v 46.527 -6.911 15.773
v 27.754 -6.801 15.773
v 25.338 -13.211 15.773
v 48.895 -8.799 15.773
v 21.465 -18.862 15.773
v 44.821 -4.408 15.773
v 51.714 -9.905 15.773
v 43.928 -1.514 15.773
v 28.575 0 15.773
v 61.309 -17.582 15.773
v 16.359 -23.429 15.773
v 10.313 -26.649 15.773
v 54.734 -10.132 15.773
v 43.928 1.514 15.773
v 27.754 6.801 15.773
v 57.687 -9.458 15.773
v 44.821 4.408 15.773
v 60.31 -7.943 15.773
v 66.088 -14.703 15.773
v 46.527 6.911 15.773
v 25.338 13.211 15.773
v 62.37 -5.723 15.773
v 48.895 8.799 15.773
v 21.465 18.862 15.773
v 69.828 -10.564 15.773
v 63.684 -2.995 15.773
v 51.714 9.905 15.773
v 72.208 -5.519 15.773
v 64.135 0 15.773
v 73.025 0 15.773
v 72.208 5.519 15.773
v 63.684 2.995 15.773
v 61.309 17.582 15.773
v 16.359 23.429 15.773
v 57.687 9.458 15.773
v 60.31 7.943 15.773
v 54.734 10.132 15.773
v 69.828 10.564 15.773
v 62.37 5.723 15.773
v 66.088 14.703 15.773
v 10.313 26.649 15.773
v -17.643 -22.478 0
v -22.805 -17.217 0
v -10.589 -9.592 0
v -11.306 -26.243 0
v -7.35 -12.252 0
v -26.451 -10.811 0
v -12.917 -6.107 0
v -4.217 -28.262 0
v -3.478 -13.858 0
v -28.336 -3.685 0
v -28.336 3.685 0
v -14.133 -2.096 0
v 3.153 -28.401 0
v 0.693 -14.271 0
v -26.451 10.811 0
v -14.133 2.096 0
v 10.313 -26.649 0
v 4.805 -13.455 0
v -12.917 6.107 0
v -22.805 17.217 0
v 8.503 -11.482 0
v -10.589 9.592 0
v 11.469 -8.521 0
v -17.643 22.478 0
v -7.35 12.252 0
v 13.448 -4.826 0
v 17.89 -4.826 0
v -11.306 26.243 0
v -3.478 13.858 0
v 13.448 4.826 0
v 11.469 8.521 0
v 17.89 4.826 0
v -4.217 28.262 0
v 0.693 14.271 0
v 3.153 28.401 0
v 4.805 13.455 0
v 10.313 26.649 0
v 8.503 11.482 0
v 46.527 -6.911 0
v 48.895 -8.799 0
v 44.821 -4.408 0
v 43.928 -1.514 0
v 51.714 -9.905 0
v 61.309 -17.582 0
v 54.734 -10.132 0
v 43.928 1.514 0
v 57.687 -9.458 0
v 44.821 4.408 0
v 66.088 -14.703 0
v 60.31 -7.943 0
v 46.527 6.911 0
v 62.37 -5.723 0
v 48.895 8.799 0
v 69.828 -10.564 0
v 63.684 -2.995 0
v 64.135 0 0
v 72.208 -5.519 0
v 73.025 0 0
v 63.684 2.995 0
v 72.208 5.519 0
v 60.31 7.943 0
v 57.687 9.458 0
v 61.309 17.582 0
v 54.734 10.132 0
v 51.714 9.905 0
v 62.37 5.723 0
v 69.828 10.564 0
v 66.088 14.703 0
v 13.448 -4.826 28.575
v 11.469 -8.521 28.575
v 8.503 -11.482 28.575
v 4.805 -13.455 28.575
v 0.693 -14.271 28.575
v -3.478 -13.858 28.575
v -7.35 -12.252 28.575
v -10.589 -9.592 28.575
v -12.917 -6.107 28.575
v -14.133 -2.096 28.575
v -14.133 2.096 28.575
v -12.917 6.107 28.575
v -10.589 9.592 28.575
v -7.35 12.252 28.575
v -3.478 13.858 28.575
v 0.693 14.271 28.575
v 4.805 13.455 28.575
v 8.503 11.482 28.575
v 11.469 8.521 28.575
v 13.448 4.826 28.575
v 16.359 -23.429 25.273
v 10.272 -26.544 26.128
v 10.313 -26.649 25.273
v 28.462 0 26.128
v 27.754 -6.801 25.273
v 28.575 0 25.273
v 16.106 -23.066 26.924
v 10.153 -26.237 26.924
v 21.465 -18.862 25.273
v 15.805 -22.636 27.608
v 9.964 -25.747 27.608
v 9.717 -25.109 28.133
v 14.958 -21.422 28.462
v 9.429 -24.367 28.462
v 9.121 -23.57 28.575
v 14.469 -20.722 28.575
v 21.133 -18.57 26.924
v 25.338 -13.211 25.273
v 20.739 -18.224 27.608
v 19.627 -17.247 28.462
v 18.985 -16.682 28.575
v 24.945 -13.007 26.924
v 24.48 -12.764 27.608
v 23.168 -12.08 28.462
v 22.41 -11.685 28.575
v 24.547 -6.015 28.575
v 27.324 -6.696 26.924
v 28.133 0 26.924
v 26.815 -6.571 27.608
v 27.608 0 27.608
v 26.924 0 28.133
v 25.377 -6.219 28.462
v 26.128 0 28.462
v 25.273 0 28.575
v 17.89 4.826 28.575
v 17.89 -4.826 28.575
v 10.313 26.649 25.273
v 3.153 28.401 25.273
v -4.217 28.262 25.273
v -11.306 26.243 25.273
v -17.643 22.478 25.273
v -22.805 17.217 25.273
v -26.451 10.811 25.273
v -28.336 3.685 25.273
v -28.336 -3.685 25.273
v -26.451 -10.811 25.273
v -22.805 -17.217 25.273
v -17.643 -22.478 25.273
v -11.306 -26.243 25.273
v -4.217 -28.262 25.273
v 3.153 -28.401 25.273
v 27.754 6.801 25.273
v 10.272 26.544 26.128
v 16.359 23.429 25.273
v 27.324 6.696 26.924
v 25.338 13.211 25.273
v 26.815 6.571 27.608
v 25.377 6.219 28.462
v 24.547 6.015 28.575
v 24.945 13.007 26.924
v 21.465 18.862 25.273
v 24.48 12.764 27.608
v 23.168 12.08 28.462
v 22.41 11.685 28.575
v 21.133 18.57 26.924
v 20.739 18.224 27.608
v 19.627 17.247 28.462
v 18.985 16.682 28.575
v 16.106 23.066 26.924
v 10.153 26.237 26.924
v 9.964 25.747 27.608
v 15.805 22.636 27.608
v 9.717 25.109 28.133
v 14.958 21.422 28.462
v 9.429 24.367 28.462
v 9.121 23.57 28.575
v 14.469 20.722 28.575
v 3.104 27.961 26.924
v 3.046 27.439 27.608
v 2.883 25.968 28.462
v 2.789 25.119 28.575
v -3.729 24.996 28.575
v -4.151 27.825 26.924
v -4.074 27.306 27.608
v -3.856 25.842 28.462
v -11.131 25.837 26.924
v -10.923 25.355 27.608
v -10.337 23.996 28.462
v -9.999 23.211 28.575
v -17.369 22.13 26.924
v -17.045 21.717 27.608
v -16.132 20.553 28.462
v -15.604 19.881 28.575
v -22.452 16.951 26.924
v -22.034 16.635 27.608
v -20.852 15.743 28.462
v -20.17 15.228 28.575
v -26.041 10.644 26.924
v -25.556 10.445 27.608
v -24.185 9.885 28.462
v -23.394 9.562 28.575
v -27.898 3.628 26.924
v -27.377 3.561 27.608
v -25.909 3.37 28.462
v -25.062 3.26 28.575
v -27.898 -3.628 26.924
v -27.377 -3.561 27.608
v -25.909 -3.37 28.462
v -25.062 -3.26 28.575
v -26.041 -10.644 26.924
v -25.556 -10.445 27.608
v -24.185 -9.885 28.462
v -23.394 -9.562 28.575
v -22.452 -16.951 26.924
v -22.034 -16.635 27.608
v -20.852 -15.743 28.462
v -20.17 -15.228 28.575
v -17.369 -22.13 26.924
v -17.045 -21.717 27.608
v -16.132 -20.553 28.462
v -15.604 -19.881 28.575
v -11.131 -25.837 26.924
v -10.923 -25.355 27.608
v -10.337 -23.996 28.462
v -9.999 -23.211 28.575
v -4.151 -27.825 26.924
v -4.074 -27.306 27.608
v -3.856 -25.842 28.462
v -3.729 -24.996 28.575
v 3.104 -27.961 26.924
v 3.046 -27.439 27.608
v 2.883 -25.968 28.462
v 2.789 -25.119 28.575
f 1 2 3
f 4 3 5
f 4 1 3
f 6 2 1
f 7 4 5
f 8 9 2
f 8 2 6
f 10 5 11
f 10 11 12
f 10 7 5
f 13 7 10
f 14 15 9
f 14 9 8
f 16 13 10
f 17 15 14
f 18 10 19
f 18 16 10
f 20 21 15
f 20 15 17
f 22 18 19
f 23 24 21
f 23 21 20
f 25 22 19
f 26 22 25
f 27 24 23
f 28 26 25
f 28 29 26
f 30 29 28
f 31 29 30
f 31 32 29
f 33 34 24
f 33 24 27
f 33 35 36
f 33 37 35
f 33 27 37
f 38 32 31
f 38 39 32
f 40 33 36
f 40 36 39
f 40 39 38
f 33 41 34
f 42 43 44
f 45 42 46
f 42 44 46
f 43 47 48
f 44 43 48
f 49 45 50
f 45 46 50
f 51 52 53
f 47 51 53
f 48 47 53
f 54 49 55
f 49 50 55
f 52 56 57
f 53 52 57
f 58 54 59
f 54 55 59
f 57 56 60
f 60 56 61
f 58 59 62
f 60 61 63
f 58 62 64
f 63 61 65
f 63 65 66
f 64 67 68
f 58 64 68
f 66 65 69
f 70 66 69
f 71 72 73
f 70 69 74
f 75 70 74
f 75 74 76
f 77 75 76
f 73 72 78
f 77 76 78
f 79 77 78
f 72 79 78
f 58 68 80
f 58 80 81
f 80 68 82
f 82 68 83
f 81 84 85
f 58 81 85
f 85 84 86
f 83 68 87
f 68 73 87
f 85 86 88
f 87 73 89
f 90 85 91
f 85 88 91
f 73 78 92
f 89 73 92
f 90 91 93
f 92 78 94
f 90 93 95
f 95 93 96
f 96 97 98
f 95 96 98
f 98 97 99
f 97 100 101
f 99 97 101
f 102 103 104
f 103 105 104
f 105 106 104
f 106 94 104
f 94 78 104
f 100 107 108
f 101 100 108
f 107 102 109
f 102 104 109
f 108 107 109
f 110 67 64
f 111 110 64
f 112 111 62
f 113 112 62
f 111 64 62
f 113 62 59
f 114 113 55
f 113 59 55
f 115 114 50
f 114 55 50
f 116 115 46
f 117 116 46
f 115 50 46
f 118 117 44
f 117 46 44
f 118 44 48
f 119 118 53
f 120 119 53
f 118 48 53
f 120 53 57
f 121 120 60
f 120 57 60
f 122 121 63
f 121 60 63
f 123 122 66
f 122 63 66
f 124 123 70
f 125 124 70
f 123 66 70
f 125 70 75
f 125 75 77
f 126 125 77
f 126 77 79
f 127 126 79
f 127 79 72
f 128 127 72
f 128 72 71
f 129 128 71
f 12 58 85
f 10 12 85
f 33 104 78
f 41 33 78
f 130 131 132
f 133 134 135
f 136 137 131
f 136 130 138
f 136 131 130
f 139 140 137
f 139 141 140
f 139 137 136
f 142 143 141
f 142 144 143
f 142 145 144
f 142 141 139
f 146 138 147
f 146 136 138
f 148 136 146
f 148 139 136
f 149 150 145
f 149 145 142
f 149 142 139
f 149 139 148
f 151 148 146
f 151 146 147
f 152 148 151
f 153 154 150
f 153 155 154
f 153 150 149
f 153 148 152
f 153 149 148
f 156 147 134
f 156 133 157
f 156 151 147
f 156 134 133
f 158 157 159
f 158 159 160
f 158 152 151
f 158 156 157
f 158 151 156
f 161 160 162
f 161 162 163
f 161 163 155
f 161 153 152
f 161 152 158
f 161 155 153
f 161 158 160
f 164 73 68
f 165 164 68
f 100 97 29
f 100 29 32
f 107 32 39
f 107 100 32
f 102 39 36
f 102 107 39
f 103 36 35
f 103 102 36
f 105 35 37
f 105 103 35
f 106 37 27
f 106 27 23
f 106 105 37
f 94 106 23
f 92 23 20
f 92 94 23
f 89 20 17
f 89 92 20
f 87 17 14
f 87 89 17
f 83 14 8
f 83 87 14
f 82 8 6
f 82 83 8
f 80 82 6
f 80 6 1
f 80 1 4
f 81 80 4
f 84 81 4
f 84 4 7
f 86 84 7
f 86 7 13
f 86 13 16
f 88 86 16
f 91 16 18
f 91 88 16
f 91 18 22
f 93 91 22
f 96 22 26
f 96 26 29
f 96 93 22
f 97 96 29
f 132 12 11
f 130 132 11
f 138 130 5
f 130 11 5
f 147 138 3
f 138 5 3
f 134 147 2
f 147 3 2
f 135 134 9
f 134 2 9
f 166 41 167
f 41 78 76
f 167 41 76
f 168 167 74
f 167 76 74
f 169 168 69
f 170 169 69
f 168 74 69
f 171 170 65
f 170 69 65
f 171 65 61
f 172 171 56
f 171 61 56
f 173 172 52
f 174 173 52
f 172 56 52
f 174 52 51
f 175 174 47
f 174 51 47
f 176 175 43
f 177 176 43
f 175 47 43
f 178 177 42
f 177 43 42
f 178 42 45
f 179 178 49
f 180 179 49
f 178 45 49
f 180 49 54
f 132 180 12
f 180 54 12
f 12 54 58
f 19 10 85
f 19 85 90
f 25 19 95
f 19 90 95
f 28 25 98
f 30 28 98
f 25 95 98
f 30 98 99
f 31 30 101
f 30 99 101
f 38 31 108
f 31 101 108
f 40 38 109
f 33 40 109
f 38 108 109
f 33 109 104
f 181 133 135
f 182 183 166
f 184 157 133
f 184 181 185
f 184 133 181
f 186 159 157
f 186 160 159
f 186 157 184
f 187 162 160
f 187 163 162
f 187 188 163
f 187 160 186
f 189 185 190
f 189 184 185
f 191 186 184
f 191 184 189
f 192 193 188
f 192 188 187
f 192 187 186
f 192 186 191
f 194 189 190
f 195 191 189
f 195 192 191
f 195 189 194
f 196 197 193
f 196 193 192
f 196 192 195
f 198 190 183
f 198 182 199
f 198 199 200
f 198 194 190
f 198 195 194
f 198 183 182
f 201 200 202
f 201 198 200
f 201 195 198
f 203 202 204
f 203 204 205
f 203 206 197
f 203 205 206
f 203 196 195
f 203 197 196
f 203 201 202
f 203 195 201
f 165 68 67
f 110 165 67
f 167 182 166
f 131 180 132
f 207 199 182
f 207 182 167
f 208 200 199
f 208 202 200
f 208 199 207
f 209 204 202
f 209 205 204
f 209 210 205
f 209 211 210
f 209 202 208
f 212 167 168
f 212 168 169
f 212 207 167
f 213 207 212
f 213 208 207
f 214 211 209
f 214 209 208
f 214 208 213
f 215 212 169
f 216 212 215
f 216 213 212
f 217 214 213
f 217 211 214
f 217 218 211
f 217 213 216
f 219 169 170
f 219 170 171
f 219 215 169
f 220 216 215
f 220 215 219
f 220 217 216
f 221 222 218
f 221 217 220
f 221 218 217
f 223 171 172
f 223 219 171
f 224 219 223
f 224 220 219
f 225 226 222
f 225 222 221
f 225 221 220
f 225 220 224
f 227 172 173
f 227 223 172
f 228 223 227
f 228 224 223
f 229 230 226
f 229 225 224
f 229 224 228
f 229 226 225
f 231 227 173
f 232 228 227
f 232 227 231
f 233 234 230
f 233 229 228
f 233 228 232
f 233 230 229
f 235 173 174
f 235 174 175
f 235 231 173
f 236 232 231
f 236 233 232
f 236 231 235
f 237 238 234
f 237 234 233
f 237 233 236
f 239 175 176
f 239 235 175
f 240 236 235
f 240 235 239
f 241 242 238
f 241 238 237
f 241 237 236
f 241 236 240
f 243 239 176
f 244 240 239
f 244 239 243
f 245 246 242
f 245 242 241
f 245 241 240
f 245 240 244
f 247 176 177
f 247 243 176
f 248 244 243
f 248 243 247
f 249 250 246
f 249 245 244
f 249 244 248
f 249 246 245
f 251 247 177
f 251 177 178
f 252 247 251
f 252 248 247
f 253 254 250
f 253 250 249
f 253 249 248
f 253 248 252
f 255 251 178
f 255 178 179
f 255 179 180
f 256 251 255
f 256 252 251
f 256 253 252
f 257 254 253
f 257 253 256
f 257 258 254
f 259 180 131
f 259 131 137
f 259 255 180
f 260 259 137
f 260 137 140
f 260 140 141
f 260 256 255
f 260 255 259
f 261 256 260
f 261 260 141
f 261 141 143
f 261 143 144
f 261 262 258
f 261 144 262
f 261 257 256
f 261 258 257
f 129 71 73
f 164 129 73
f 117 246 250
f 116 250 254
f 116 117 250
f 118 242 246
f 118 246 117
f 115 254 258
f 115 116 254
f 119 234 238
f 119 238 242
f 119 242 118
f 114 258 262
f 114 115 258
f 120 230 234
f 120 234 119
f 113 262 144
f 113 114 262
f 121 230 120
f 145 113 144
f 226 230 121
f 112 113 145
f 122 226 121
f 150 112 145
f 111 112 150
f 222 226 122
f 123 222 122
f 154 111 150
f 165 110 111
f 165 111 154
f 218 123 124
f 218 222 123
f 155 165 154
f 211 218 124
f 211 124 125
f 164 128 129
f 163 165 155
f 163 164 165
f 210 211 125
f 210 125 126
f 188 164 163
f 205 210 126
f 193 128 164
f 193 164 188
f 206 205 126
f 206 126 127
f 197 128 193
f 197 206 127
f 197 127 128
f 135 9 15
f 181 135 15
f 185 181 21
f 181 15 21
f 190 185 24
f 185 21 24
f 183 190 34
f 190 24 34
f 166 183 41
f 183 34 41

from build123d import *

# Parameters (mm, degrees)
F1_DEPTH = 28.575
F0_R     = 10.16
F2_DEPTH = 15.7734
F3_R     = 3.302


with BuildPart() as f1:
    # F0 (on Top) → F1 (new body)
    with BuildSketch(Plane.XY):
        with BuildLine():
            ThreePointArc((10.312698, -26.649182), (23.571338, -16.1531), (28.575, 0))
            ThreePointArc((28.575, 0), (23.571338, 16.1531), (10.312698, 26.649182))
            ThreePointArc((10.312698, 26.649182), (-28.575, 0), (10.312698, -26.649182))
        make_face()
        with BuildLine():
            ThreePointArc((13.447765, -4.826), (-14.2875, 0), (13.447765, 4.826))
            Line((13.447765, 4.826), (14.2875, 4.826))
            Line((14.2875, 4.826), (17.889793, 4.826))
            Line((17.889793, 4.826), (17.889793, -4.826))
            Line((17.889793, -4.826), (13.447765, -4.826))
        make_face(mode=Mode.SUBTRACT)
    extrude(amount=F1_DEPTH)

    # F0 (on Top) → F2 (join)
    with BuildSketch(Plane.XY):
        with BuildLine():
            ThreePointArc((10.312698, 26.649182), (23.571338, 16.1531), (28.575, 0))
            ThreePointArc((28.575, 0), (23.571338, -16.1531), (10.312698, -26.649182))
            Line((10.312698, -26.649182), (61.308758, -17.581766))
            ThreePointArc((61.308758, -17.581766), (73.025, 0), (61.308758, 17.581766))
            Line((61.308758, 17.581766), (10.312698, 26.649182))
        make_face()
        with Locations((53.975, 0)):
            Circle(F0_R, mode=Mode.SUBTRACT)
    extrude(amount=F2_DEPTH)

    # F3
    f3_edges = [f1.edges().sort_by_distance(p)[0] for p in [
        (-10.312698, 26.649182, 28.575),
    ]]
    fillet(f3_edges, radius=F3_R)


solid = f1.part
